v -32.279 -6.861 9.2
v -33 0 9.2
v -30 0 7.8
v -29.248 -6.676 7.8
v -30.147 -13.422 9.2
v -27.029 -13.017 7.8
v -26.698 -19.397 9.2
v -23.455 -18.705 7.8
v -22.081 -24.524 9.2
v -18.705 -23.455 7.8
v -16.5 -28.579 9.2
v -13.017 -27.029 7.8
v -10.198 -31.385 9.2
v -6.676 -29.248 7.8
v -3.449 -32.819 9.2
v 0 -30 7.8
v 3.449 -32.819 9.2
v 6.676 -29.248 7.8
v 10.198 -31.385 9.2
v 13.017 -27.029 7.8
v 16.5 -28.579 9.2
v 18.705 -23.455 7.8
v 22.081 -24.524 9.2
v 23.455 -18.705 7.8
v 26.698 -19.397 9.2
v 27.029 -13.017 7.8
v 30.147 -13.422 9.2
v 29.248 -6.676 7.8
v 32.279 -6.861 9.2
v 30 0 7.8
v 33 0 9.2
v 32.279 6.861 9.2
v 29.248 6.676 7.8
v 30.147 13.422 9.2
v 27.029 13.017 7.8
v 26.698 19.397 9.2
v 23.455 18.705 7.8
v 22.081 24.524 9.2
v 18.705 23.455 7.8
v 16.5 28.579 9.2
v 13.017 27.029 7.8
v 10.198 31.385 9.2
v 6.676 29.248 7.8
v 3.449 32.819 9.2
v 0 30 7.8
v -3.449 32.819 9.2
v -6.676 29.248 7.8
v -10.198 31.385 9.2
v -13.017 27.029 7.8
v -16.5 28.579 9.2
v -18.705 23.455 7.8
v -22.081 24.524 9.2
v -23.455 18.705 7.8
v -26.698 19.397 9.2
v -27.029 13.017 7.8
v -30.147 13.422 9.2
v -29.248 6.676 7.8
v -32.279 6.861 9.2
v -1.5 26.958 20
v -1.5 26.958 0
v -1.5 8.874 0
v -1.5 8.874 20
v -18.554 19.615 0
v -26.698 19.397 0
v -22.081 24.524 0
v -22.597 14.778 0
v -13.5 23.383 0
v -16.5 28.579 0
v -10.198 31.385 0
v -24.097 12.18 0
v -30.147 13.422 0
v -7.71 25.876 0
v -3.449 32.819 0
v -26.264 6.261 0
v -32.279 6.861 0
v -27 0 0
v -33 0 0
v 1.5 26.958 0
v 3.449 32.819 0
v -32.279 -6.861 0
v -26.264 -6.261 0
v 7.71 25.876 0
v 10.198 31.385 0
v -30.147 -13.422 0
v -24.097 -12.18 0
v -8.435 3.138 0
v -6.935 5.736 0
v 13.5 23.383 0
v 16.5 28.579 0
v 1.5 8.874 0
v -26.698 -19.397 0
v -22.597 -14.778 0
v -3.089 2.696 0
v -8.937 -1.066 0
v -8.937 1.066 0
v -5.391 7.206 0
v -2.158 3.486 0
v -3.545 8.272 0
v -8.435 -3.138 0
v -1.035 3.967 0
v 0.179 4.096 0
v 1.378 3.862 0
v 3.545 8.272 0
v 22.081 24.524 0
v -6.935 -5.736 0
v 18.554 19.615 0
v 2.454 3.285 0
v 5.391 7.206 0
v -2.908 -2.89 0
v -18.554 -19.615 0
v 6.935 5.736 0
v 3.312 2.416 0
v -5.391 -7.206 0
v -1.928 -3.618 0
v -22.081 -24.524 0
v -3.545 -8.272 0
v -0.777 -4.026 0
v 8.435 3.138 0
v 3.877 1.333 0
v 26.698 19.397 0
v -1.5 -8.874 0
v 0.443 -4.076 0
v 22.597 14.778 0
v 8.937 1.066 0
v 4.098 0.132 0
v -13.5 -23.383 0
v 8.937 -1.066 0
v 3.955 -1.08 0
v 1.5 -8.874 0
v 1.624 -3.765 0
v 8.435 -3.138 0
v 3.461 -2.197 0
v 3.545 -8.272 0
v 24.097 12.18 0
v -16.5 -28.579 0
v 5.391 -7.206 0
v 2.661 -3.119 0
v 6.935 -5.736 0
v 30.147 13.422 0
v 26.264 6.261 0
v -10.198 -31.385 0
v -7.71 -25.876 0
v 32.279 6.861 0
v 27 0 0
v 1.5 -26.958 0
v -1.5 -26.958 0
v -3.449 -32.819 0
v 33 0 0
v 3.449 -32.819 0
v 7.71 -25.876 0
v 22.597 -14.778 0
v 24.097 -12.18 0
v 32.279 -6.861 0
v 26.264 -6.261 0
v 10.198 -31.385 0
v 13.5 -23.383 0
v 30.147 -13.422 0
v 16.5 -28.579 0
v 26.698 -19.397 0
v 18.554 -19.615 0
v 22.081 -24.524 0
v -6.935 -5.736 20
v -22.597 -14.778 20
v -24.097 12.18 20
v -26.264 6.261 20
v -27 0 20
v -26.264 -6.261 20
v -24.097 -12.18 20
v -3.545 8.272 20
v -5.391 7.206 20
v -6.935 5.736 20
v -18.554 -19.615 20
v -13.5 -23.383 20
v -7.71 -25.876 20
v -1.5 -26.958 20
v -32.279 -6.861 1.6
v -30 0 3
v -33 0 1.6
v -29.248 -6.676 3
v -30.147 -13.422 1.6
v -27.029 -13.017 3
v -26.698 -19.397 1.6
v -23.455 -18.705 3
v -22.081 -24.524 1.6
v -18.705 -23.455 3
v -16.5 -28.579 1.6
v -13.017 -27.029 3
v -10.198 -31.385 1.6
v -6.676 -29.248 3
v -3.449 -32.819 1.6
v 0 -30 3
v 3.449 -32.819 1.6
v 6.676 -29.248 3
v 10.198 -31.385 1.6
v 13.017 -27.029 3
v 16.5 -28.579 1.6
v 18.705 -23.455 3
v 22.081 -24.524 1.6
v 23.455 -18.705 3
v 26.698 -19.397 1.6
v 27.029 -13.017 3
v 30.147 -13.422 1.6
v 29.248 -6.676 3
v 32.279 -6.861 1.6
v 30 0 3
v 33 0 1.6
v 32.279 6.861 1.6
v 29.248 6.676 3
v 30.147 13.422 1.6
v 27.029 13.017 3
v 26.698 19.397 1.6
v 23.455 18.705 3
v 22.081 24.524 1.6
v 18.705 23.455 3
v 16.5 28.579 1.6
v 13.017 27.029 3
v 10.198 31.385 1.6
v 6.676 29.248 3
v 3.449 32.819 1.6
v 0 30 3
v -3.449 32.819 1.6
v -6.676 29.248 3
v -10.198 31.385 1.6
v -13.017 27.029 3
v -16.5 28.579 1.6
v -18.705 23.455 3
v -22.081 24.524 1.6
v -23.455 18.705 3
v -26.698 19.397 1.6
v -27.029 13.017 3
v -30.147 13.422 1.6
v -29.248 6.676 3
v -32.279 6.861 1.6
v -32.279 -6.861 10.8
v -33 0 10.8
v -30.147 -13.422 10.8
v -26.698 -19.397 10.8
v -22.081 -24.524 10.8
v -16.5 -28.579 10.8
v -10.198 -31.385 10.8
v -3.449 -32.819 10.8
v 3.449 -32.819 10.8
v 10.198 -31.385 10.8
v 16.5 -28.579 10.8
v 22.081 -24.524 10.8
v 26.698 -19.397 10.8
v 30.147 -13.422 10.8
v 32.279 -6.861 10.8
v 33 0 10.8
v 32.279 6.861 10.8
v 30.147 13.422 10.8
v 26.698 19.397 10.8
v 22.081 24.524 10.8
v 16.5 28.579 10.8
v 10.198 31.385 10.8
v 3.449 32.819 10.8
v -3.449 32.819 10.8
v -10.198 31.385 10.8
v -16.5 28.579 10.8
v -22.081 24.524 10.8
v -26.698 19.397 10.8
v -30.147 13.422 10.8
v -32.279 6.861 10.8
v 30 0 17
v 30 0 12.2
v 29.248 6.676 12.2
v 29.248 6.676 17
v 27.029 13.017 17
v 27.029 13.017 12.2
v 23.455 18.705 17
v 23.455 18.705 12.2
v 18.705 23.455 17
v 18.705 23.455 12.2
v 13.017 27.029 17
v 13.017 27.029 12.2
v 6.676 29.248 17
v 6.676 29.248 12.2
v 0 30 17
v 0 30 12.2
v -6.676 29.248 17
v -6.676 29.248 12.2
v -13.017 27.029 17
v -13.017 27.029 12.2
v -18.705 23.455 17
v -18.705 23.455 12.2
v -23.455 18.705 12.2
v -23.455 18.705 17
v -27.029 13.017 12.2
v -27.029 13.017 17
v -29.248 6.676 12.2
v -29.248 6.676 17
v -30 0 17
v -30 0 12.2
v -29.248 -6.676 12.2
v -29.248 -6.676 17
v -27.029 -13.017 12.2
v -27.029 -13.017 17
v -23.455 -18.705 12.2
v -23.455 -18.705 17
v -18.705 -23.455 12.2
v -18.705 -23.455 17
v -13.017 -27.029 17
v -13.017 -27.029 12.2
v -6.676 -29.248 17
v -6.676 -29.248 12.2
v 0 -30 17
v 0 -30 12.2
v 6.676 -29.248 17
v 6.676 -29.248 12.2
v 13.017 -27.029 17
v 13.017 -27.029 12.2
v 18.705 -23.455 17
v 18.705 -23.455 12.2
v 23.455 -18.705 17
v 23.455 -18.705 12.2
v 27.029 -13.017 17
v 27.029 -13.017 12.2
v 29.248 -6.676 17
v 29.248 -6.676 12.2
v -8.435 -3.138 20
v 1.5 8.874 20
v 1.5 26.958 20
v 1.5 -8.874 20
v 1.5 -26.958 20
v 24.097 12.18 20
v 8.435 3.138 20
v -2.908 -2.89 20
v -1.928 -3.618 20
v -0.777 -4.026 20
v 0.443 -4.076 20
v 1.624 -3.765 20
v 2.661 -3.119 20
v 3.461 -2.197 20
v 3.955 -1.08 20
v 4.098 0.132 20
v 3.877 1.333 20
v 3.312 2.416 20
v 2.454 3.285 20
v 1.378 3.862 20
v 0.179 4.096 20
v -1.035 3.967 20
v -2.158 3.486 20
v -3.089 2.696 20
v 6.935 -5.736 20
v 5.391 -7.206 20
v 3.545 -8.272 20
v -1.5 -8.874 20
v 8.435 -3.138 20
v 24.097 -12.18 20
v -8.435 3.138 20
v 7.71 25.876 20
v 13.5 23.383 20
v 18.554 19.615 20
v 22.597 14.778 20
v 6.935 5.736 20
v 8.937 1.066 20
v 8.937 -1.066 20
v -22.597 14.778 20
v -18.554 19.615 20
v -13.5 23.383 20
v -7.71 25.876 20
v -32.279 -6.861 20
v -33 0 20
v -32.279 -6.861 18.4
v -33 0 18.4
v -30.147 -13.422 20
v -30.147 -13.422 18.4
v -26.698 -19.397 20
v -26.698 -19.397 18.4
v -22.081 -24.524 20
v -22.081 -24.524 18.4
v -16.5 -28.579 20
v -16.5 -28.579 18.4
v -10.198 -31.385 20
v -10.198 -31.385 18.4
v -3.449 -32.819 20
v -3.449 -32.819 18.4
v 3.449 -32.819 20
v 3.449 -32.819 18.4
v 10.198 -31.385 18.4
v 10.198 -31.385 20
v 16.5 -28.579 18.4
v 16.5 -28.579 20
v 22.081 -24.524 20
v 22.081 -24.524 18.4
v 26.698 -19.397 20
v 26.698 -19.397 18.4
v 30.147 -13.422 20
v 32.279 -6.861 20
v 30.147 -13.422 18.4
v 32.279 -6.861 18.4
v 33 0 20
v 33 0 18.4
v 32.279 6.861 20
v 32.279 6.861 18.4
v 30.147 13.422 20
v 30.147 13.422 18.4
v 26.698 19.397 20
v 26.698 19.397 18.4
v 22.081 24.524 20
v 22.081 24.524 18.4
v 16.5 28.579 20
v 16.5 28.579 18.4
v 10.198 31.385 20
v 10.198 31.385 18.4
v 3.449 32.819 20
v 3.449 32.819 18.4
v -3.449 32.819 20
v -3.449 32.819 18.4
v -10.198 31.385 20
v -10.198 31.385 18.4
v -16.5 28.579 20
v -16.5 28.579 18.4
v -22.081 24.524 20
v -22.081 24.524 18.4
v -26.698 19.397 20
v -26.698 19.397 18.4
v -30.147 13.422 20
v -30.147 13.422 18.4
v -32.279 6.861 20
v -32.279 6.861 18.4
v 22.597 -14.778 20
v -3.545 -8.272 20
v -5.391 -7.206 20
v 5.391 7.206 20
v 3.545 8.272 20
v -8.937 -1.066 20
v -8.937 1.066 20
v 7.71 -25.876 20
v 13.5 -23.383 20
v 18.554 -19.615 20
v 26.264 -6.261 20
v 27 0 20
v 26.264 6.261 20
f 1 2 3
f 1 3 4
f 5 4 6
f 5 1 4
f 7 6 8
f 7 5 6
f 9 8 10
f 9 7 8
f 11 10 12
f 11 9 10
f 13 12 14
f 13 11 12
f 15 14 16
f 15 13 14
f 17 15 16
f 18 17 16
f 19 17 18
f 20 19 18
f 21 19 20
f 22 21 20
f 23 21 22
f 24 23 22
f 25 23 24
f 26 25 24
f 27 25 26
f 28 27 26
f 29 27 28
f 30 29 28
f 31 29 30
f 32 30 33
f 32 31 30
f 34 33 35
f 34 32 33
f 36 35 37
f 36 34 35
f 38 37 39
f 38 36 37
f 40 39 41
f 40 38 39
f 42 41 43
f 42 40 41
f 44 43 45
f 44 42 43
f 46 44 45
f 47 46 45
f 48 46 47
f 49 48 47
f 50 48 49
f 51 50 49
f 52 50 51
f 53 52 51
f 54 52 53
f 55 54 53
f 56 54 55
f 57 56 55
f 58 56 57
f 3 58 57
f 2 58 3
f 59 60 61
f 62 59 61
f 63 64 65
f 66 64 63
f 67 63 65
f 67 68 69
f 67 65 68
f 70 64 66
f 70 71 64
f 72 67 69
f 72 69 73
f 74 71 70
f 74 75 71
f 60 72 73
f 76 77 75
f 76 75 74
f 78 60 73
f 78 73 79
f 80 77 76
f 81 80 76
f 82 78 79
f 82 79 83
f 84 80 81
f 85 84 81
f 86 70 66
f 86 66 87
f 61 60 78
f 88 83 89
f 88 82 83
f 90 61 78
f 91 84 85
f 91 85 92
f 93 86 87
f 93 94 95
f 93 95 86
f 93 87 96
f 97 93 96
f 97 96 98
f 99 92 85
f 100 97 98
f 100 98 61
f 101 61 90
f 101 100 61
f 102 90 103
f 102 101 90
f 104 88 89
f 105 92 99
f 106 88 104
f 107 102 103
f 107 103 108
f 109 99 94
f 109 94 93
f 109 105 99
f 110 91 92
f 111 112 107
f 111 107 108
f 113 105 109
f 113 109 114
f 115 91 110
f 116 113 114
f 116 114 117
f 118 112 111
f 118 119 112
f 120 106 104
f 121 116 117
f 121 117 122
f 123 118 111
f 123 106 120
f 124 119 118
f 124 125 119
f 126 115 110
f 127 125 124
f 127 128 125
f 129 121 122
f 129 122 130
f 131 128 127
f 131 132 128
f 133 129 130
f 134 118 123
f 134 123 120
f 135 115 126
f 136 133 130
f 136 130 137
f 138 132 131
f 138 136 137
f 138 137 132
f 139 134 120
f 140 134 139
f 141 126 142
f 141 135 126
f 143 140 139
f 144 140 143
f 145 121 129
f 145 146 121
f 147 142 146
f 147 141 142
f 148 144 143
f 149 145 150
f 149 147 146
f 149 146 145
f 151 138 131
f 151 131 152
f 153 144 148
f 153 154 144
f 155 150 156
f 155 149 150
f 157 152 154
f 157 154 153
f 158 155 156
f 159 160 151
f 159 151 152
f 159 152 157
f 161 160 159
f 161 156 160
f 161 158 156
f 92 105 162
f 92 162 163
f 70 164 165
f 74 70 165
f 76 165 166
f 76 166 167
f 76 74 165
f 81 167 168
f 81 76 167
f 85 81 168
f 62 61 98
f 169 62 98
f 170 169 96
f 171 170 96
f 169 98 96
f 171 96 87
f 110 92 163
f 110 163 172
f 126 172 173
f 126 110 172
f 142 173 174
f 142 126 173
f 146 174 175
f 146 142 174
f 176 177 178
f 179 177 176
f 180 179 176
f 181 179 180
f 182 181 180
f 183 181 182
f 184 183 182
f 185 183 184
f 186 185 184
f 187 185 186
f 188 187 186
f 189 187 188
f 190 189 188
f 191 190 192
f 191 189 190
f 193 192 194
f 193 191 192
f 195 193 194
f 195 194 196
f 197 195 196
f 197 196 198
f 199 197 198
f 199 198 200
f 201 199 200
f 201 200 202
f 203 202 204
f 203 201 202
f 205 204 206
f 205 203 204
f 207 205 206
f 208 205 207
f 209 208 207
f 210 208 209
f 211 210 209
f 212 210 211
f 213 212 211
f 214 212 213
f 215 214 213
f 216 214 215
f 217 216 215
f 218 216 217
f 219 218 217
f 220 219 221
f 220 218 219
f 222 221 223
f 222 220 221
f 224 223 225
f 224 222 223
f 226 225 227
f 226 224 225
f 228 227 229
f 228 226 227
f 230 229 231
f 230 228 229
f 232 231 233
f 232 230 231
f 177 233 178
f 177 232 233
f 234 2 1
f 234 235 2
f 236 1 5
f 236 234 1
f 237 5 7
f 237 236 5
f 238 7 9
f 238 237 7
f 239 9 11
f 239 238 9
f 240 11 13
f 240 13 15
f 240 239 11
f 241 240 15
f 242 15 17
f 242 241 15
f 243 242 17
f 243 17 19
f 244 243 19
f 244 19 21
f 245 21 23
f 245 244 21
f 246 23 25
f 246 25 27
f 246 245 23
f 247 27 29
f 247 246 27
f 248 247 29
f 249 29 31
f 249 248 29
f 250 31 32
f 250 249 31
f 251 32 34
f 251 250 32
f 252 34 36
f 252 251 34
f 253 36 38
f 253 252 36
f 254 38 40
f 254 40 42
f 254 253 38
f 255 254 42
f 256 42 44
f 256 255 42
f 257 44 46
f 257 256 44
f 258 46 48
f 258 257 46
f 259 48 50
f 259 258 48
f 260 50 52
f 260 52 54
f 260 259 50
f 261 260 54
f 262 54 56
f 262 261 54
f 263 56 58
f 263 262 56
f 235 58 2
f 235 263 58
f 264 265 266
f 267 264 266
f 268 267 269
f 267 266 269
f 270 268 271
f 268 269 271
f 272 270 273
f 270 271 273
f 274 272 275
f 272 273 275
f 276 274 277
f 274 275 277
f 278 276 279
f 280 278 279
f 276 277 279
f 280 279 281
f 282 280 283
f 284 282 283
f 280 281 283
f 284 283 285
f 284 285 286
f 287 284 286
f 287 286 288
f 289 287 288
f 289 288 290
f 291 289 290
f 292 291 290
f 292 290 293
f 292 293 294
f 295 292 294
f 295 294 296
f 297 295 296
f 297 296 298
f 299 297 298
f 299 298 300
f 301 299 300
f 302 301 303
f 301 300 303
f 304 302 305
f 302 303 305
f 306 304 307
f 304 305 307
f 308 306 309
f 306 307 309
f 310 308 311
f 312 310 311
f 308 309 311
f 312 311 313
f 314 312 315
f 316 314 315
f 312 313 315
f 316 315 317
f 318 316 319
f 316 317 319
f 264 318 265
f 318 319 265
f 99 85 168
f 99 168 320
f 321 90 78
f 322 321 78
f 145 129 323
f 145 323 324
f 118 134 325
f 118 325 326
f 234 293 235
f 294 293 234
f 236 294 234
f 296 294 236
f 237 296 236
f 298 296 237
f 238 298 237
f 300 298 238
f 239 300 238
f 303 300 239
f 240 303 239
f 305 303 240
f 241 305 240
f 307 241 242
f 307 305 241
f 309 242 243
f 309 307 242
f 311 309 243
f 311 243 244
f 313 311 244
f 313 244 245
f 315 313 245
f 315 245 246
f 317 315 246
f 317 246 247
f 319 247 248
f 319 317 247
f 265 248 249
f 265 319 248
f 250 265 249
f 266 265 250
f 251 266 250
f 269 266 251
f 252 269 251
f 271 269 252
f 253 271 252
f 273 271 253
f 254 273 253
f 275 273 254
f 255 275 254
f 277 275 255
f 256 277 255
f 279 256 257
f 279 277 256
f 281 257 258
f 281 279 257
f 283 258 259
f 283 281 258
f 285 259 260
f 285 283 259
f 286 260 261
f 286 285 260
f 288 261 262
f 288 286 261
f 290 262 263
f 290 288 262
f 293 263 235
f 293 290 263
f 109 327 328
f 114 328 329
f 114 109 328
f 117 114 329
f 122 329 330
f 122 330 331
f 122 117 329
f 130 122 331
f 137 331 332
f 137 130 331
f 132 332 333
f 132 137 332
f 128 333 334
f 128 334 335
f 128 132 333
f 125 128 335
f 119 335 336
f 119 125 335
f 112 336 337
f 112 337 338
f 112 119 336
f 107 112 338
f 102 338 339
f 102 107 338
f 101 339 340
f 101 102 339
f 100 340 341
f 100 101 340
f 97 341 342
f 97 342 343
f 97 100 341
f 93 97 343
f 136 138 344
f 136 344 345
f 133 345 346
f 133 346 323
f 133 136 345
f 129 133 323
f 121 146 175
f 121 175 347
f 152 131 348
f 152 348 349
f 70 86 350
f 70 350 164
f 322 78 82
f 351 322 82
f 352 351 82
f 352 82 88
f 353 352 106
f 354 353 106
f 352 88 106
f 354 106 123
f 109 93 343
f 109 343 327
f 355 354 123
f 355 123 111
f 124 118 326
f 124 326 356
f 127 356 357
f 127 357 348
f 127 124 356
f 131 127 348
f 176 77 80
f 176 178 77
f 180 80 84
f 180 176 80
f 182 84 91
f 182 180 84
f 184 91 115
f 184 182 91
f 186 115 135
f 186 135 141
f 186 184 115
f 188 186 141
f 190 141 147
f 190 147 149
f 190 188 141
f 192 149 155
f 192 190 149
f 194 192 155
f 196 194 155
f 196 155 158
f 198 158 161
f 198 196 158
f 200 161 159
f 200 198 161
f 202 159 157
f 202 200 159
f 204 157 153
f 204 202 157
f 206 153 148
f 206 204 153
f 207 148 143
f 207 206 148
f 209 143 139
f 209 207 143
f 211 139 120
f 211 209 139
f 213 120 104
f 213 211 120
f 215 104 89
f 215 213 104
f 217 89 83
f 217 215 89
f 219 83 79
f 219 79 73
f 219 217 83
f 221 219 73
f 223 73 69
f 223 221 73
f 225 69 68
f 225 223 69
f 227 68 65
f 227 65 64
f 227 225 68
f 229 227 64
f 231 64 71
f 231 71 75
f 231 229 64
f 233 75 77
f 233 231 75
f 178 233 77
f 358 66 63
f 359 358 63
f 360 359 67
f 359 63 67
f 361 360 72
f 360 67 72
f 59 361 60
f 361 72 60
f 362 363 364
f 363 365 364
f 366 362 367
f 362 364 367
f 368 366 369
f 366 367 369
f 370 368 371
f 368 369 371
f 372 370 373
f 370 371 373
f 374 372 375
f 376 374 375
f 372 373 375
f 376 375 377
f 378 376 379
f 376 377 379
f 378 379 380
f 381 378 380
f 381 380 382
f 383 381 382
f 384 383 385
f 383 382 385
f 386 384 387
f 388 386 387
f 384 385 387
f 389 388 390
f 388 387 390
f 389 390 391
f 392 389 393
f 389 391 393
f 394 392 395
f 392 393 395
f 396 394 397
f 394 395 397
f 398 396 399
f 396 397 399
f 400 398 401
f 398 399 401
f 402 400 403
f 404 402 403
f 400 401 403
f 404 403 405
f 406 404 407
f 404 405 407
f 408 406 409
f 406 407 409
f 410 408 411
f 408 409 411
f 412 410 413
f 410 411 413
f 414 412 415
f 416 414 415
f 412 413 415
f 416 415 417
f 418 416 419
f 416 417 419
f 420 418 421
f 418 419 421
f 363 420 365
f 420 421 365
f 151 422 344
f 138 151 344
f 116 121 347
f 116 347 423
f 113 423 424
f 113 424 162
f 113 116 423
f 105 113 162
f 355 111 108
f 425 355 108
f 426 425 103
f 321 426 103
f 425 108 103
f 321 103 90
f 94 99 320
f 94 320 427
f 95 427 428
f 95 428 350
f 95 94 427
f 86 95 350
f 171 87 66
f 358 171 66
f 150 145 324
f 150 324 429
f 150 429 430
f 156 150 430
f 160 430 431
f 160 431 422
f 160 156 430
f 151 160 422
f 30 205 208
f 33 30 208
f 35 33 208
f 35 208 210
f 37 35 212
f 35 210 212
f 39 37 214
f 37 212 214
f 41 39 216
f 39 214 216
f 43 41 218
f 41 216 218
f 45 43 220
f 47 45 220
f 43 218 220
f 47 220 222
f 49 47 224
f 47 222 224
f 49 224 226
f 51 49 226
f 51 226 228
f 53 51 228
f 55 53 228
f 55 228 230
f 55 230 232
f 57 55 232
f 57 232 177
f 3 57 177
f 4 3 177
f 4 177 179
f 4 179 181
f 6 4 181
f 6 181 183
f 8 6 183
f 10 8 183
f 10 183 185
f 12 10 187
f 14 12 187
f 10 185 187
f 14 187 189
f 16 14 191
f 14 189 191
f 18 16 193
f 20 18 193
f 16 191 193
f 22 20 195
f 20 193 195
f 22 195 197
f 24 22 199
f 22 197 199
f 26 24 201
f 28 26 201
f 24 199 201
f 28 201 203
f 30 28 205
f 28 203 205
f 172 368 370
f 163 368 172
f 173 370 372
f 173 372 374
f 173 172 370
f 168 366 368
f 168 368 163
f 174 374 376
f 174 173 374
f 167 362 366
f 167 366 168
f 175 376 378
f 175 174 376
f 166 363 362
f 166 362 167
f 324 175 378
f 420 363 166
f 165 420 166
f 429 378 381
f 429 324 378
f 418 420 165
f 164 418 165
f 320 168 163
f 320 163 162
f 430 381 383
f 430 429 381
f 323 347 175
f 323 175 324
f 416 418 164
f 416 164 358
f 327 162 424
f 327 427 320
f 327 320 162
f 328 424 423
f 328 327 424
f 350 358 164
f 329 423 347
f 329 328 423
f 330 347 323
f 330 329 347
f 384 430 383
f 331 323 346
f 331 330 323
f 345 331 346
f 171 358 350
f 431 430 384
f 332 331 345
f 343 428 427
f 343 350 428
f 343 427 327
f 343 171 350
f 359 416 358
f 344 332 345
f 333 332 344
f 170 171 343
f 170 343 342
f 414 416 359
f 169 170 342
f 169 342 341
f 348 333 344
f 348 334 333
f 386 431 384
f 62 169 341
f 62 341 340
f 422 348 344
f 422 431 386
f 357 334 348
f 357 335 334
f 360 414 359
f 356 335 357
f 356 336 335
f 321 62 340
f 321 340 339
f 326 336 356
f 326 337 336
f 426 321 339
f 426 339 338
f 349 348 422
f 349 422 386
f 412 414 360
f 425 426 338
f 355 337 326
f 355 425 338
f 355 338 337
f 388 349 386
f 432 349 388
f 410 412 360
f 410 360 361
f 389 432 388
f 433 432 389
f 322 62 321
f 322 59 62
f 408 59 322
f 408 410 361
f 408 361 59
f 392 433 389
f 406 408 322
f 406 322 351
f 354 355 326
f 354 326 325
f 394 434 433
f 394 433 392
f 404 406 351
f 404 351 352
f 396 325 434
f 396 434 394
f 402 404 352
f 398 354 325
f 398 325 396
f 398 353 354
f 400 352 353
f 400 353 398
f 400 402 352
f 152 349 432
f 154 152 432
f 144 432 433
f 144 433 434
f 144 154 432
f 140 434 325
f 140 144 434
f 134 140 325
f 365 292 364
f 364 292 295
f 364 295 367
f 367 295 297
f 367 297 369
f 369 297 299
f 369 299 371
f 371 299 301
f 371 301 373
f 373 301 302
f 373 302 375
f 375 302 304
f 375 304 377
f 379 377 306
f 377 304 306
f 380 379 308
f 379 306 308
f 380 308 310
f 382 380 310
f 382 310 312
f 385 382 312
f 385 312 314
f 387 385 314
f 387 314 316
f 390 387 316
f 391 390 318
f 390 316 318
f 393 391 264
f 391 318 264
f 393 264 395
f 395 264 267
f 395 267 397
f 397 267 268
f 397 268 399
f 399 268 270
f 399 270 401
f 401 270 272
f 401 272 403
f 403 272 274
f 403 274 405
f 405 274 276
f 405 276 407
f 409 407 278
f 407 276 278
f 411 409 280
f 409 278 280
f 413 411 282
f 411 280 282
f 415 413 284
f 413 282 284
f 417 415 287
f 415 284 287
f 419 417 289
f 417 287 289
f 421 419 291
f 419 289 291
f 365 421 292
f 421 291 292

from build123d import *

# Parameters (mm, degrees)
SKETCH_1_R      = 30
EXTRUDE_1_DEPTH = 20


with BuildPart() as part:
    # 草图1 → 凸台-拉伸1 (new body)
    with BuildSketch(Plane.XY):
        Circle(SKETCH_1_R)
        with BuildLine():
            Line((-3.088645972, 2.69634309), (-2.908227328, -2.89001969))
            ThreePointArc((-2.908227328, -2.89001969), (4.097863422, 0.132345676), (-3.088645972, 2.69634309))
        make_face(mode=Mode.SUBTRACT)
        with BuildLine():
            Line((22.596573624, 14.778188672), (6.935213074, 5.736097943))
            ThreePointArc((6.935213074, 5.736097943), (4.5, 7.794228634), (1.5, 8.874119675))
            Line((1.5, 8.874119675), (1.5, 26.958301133))
            ThreePointArc((1.5, 26.958301133), (13.5, 23.382685902), (22.596573624, 14.778188672))
        make_face(mode=Mode.SUBTRACT)
        with BuildLine():
            Line((-1.5, 26.958301133), (-1.5, 8.874119675))
            ThreePointArc((-1.5, 8.874119675), (-4.5, 7.794228634), (-6.935213074, 5.736097943))
            Line((-6.935213074, 5.736097943), (-22.596573624, 14.778188672))
            ThreePointArc((-22.596573624, 14.778188672), (-13.5, 23.382685902), (-1.5, 26.958301133))
        make_face(mode=Mode.SUBTRACT)
        with BuildLine():
            Line((24.096573624, 12.180112461), (8.435213074, 3.138021732))
            ThreePointArc((8.435213074, 3.138021732), (9, 0), (8.435213074, -3.138021732))
            Line((8.435213074, -3.138021732), (24.096573624, -12.180112461))
            ThreePointArc((24.096573624, -12.180112461), (27, 0), (24.096573624, 12.180112461))
        make_face(mode=Mode.SUBTRACT)
        with BuildLine():
            Line((22.596573624, -14.778188672), (6.935213074, -5.736097943))
            ThreePointArc((6.935213074, -5.736097943), (4.5, -7.794228634), (1.5, -8.874119675))
            Line((1.5, -8.874119675), (1.5, -26.958301133))
            ThreePointArc((1.5, -26.958301133), (13.5, -23.382685902), (22.596573624, -14.778188672))
        make_face(mode=Mode.SUBTRACT)
        with BuildLine():
            Line((-1.5, -26.958301133), (-1.5, -8.874119675))
            ThreePointArc((-1.5, -8.874119675), (-4.5, -7.794228634), (-6.935213074, -5.736097943))
            Line((-6.935213074, -5.736097943), (-22.596573624, -14.778188672))
            ThreePointArc((-22.596573624, -14.778188672), (-13.5, -23.382685902), (-1.5, -26.958301133))
        make_face(mode=Mode.SUBTRACT)
        with BuildLine():
            Line((-24.096573624, -12.180112461), (-8.435213074, -3.138021732))
            ThreePointArc((-8.435213074, -3.138021732), (-9, 0), (-8.435213074, 3.138021732))
            Line((-8.435213074, 3.138021732), (-24.096573624, 12.180112461))
            ThreePointArc((-24.096573624, 12.180112461), (-27, 0), (-24.096573624, -12.180112461))
        make_face(mode=Mode.SUBTRACT)
    extrude(amount=EXTRUDE_1_DEPTH)

    # 草图2 → 旋转1 (revolve)
    with BuildSketch(Plane.ZY, mode=Mode.PRIVATE) as revolve_1_sk:
        Polygon((0, -30), (0, -33), (1.6, -33), (3, -30), align=None)
        Polygon((17, -30), (20, -30), (20, -33), (18.4, -33), align=None)
        Polygon((7.8, -30), (9.2, -33), (10.8, -33), (12.2, -30), align=None)
    revolve(revolve_1_sk.sketch.rotate(Axis((0, 0, 0), (0, 0, 1)), 270), axis=Axis((0, 0, 0), (0, 0, 1)))


solid = part.part
